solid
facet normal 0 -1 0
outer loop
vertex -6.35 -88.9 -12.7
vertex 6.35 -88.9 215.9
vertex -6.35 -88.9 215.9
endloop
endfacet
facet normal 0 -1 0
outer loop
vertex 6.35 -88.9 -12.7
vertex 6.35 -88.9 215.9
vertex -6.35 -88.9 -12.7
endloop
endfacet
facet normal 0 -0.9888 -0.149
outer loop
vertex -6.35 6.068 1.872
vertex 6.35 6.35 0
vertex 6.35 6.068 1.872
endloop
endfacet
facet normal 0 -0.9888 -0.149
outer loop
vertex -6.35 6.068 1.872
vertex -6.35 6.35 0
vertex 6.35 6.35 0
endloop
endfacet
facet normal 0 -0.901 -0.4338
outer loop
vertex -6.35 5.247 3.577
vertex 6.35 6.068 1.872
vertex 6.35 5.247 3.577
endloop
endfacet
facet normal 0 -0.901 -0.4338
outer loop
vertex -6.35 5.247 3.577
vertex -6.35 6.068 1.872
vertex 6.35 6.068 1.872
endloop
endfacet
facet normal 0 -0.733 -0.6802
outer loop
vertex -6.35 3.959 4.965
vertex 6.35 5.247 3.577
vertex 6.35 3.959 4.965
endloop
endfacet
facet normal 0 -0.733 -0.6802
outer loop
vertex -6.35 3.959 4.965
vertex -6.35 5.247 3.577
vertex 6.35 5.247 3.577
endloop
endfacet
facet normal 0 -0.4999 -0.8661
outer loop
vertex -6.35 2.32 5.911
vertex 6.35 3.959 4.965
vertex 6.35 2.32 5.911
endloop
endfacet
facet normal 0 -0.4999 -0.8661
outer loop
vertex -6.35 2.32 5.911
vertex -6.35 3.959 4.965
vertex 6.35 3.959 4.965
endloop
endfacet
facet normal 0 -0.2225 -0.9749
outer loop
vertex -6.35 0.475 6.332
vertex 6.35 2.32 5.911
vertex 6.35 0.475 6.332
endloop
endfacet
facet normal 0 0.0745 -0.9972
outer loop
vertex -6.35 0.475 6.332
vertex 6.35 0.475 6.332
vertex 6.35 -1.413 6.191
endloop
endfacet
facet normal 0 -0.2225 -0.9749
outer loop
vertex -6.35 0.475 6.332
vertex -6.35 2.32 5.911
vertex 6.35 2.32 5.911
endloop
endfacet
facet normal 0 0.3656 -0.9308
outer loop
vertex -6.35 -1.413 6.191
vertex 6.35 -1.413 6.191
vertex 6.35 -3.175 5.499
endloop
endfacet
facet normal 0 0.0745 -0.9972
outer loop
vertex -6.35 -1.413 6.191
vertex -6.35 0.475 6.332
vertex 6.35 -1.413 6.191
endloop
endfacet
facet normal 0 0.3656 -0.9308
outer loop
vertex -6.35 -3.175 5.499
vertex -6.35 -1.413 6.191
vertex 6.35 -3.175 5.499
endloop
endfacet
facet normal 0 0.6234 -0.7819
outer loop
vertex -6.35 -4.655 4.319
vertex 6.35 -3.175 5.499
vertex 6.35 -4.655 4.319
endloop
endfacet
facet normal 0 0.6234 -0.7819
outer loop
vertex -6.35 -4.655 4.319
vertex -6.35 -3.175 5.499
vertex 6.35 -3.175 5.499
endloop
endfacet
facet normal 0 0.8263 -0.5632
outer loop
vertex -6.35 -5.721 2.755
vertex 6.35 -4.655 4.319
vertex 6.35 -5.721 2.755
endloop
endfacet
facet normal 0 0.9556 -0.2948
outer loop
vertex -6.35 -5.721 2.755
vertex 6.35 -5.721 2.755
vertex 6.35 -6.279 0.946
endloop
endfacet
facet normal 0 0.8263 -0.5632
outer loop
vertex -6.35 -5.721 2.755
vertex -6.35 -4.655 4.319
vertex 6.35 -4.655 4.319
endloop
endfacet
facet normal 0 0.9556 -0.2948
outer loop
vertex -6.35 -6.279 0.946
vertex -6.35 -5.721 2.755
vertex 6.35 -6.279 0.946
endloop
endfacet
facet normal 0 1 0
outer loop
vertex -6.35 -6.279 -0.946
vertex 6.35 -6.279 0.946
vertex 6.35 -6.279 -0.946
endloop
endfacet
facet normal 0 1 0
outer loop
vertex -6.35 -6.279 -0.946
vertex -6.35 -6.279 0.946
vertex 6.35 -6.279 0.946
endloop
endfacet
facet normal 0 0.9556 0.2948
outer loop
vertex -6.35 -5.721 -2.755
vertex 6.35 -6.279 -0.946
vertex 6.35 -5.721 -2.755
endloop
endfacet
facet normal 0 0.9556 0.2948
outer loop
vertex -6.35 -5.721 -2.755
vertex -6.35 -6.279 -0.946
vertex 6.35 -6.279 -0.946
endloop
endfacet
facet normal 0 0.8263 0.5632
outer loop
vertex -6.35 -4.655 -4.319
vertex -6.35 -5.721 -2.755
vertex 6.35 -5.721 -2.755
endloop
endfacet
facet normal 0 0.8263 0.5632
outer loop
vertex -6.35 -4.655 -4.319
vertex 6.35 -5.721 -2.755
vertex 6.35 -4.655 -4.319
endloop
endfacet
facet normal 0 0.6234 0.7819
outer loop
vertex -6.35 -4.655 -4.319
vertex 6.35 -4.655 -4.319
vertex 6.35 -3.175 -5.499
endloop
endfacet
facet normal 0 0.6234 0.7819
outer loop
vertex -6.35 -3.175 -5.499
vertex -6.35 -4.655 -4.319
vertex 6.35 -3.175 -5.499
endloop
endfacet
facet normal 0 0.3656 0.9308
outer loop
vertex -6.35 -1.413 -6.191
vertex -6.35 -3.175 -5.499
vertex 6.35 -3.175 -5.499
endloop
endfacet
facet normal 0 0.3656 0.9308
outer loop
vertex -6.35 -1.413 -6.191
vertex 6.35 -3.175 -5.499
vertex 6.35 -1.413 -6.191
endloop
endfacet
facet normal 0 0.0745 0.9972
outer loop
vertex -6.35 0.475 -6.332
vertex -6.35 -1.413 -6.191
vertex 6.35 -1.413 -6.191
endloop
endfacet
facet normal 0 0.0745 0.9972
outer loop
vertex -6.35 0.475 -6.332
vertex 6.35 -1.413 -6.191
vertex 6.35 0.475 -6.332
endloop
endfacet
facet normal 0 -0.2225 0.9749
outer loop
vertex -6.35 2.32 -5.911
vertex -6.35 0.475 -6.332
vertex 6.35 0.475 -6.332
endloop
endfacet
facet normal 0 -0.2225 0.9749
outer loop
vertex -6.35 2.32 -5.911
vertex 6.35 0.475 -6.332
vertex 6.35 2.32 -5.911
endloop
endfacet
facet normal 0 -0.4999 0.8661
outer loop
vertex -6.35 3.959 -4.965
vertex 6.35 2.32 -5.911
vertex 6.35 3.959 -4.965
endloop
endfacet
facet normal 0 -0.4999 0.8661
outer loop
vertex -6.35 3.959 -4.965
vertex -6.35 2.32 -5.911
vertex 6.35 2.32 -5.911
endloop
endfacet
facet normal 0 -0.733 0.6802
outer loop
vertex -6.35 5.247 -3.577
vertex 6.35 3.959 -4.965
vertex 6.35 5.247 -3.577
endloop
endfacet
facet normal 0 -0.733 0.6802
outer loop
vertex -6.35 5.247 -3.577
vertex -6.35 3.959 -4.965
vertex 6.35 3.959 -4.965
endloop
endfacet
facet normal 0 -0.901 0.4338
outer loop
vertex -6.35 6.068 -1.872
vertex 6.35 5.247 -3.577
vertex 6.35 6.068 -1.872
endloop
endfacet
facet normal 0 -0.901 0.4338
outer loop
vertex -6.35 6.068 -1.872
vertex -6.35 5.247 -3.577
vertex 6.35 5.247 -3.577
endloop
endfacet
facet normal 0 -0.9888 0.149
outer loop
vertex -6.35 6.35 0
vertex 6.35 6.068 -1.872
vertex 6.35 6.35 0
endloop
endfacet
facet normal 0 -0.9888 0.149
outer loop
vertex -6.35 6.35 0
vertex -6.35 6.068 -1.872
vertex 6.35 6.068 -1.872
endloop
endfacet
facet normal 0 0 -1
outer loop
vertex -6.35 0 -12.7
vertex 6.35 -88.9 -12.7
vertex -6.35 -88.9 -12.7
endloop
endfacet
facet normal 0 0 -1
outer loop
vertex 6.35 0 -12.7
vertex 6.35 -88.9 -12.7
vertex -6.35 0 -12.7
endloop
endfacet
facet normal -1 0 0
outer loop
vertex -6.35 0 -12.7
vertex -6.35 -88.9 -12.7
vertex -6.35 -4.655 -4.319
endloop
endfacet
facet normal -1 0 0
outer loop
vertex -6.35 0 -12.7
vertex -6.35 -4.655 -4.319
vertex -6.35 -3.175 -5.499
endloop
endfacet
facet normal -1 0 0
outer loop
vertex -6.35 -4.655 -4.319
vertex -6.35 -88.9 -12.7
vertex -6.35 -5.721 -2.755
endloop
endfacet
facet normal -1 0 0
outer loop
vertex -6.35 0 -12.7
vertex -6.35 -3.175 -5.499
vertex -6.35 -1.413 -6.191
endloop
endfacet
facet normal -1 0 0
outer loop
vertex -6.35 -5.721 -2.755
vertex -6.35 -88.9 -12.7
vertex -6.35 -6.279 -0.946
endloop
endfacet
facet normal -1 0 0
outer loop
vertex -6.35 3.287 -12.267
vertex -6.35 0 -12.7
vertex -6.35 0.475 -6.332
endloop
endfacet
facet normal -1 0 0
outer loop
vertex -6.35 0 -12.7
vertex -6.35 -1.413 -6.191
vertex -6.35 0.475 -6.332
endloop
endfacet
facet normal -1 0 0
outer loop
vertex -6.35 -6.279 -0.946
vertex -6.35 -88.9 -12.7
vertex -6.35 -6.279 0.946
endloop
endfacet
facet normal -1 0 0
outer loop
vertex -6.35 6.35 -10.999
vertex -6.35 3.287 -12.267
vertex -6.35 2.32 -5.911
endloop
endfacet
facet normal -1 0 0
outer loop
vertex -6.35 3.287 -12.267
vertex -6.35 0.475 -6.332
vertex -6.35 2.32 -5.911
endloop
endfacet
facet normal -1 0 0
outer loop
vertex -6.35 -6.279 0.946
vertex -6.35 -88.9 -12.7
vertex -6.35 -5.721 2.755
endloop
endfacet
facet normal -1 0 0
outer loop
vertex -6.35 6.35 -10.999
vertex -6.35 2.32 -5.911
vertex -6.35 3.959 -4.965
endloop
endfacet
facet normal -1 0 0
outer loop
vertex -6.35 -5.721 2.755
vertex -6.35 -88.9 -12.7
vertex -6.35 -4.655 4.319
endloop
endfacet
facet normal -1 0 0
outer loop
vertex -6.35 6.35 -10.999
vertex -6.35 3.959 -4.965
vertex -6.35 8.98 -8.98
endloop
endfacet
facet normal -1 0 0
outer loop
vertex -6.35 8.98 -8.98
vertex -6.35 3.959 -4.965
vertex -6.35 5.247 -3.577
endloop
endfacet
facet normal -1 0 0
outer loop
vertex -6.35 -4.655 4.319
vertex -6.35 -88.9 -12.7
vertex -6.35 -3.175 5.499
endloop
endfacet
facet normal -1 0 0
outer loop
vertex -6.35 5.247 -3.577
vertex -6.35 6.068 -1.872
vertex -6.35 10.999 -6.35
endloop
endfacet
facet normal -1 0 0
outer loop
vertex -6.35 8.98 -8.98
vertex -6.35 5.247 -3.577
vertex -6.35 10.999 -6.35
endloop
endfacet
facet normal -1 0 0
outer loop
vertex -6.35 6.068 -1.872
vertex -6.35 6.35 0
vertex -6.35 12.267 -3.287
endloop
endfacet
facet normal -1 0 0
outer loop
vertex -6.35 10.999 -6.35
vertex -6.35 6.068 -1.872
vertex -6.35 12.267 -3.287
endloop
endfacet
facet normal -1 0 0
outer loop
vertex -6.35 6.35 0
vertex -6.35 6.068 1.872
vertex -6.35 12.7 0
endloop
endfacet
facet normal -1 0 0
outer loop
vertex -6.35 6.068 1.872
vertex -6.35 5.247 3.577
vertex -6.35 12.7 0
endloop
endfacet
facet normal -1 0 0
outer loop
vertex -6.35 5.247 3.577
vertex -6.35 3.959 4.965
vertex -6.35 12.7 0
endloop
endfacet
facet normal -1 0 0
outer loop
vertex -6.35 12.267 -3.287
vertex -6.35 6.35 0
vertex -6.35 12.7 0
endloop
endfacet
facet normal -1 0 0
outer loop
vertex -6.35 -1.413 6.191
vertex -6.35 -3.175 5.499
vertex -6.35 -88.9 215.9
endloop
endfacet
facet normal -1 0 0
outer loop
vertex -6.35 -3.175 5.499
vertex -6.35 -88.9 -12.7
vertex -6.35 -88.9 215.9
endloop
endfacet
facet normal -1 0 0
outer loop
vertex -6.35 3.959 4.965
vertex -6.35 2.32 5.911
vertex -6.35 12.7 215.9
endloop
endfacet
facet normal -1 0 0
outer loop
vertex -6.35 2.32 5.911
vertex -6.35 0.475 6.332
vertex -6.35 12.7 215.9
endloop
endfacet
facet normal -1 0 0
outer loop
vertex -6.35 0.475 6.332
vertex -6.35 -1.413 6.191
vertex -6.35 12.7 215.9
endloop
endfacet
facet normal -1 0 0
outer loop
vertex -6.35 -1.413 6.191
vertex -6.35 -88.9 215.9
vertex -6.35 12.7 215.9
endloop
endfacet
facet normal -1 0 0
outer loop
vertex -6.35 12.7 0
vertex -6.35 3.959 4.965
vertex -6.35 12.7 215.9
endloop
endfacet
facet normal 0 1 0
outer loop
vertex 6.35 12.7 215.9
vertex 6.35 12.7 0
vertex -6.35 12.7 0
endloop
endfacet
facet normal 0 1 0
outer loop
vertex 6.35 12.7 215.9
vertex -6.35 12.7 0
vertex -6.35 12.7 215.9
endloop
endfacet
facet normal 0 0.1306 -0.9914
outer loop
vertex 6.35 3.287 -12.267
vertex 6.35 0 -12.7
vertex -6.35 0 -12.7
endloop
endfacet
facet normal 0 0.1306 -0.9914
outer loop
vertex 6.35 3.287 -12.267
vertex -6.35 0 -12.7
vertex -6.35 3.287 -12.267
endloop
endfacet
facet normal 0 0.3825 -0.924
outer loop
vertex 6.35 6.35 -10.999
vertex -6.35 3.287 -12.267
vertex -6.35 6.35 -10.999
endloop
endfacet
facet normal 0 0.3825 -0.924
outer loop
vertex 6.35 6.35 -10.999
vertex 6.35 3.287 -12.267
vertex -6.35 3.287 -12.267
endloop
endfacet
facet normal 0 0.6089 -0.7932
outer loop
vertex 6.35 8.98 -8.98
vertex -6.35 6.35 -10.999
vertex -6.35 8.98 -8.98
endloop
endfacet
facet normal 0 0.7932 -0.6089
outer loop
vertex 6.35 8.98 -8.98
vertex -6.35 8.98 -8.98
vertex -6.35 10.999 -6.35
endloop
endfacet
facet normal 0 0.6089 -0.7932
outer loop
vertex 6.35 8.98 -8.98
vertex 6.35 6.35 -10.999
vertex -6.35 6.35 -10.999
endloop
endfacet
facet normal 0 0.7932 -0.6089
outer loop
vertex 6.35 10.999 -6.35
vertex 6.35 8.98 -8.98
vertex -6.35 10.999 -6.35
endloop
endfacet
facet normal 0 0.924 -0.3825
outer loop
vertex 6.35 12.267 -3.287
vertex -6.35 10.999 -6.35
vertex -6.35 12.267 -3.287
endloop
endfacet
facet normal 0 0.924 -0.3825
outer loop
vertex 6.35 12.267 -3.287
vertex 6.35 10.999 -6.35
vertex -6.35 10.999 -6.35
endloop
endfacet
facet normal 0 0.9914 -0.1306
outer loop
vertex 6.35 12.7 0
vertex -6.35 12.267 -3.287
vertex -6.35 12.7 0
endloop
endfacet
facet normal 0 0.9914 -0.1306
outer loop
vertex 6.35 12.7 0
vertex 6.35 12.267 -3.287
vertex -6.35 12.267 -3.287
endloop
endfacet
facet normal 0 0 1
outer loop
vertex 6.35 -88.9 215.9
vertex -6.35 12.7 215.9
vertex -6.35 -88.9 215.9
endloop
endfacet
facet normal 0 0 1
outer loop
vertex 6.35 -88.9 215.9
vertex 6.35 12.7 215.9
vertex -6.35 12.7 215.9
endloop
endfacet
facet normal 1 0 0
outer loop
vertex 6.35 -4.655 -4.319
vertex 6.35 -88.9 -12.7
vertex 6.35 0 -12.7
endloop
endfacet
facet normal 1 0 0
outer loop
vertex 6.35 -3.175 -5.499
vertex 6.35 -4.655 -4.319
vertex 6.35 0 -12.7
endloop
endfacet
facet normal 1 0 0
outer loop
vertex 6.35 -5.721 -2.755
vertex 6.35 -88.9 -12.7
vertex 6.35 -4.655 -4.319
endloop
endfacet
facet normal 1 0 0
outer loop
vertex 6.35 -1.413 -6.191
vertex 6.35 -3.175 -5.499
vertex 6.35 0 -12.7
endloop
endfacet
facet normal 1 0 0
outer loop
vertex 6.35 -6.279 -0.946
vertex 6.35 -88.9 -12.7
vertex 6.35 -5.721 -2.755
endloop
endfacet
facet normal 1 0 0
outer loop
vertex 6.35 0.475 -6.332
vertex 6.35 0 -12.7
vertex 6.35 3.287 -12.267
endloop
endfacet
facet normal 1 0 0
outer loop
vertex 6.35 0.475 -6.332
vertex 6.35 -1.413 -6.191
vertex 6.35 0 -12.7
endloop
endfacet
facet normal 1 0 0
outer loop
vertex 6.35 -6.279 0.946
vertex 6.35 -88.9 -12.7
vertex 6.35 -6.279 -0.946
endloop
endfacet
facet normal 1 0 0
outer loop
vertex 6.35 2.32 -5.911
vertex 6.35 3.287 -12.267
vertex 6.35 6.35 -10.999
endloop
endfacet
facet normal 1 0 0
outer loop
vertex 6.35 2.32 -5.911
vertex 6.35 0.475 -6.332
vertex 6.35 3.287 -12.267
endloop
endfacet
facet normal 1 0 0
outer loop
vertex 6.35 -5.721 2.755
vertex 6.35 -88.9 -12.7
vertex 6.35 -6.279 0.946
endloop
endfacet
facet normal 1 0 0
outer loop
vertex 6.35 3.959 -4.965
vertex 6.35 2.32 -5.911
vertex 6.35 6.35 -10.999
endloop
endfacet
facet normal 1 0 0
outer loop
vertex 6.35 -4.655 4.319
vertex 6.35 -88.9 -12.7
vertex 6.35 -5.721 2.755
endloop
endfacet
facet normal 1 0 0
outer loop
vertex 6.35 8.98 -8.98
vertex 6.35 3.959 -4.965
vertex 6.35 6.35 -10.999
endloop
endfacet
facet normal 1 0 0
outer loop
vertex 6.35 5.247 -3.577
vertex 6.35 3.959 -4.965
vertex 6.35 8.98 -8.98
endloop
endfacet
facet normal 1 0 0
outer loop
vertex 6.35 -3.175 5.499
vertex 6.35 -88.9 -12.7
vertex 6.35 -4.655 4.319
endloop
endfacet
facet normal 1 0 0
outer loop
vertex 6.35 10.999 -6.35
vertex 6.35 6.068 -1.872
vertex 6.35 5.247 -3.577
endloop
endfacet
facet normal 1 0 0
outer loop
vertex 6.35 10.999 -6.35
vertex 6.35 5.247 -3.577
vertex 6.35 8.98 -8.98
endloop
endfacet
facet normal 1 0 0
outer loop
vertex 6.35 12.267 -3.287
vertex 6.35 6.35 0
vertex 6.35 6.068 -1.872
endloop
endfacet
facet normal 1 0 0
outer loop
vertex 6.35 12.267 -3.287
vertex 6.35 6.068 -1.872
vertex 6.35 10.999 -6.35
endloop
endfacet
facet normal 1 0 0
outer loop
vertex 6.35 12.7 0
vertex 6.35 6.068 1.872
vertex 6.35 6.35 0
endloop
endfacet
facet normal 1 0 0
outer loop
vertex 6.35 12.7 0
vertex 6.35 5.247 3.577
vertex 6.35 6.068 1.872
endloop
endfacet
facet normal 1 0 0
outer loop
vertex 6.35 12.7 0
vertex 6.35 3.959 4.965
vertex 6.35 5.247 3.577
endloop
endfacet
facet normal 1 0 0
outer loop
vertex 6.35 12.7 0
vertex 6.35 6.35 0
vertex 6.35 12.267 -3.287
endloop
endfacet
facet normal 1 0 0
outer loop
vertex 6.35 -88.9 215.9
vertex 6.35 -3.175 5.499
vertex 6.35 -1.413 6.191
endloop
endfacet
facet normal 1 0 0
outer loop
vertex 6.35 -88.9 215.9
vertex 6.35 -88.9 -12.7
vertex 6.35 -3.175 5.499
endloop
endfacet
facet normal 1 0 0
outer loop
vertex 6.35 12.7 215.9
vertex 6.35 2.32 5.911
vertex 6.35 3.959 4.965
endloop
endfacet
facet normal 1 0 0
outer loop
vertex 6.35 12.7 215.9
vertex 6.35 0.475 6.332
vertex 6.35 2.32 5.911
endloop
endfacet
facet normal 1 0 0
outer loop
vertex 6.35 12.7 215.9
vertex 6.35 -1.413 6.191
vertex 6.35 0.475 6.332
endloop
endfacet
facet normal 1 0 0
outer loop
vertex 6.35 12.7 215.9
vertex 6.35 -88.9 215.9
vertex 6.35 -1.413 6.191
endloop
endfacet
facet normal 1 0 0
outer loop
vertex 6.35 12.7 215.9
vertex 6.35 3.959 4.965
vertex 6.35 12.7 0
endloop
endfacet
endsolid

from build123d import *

# Parameters (mm, degrees)
F0_R     = 6.35
F1_DEPTH = 6.35


with BuildPart() as f1:
    # F0 (on Right) → F1 (new body, symmetric)
    with BuildSketch(Plane.YZ):
        with BuildLine():
            Line((-88.9, -12.7), (0, -12.7))
            ThreePointArc((0, -12.7), (8.980256, -8.980256), (12.7, 0))
            Line((12.7, 0), (12.7, 215.9))
            Line((12.7, 215.9), (-88.9, 215.9))
            Line((-88.9, 215.9), (-88.9, -12.7))
        make_face()
        Circle(F0_R, mode=Mode.SUBTRACT)
    extrude(amount=F1_DEPTH, both=True)


solid = f1.part
